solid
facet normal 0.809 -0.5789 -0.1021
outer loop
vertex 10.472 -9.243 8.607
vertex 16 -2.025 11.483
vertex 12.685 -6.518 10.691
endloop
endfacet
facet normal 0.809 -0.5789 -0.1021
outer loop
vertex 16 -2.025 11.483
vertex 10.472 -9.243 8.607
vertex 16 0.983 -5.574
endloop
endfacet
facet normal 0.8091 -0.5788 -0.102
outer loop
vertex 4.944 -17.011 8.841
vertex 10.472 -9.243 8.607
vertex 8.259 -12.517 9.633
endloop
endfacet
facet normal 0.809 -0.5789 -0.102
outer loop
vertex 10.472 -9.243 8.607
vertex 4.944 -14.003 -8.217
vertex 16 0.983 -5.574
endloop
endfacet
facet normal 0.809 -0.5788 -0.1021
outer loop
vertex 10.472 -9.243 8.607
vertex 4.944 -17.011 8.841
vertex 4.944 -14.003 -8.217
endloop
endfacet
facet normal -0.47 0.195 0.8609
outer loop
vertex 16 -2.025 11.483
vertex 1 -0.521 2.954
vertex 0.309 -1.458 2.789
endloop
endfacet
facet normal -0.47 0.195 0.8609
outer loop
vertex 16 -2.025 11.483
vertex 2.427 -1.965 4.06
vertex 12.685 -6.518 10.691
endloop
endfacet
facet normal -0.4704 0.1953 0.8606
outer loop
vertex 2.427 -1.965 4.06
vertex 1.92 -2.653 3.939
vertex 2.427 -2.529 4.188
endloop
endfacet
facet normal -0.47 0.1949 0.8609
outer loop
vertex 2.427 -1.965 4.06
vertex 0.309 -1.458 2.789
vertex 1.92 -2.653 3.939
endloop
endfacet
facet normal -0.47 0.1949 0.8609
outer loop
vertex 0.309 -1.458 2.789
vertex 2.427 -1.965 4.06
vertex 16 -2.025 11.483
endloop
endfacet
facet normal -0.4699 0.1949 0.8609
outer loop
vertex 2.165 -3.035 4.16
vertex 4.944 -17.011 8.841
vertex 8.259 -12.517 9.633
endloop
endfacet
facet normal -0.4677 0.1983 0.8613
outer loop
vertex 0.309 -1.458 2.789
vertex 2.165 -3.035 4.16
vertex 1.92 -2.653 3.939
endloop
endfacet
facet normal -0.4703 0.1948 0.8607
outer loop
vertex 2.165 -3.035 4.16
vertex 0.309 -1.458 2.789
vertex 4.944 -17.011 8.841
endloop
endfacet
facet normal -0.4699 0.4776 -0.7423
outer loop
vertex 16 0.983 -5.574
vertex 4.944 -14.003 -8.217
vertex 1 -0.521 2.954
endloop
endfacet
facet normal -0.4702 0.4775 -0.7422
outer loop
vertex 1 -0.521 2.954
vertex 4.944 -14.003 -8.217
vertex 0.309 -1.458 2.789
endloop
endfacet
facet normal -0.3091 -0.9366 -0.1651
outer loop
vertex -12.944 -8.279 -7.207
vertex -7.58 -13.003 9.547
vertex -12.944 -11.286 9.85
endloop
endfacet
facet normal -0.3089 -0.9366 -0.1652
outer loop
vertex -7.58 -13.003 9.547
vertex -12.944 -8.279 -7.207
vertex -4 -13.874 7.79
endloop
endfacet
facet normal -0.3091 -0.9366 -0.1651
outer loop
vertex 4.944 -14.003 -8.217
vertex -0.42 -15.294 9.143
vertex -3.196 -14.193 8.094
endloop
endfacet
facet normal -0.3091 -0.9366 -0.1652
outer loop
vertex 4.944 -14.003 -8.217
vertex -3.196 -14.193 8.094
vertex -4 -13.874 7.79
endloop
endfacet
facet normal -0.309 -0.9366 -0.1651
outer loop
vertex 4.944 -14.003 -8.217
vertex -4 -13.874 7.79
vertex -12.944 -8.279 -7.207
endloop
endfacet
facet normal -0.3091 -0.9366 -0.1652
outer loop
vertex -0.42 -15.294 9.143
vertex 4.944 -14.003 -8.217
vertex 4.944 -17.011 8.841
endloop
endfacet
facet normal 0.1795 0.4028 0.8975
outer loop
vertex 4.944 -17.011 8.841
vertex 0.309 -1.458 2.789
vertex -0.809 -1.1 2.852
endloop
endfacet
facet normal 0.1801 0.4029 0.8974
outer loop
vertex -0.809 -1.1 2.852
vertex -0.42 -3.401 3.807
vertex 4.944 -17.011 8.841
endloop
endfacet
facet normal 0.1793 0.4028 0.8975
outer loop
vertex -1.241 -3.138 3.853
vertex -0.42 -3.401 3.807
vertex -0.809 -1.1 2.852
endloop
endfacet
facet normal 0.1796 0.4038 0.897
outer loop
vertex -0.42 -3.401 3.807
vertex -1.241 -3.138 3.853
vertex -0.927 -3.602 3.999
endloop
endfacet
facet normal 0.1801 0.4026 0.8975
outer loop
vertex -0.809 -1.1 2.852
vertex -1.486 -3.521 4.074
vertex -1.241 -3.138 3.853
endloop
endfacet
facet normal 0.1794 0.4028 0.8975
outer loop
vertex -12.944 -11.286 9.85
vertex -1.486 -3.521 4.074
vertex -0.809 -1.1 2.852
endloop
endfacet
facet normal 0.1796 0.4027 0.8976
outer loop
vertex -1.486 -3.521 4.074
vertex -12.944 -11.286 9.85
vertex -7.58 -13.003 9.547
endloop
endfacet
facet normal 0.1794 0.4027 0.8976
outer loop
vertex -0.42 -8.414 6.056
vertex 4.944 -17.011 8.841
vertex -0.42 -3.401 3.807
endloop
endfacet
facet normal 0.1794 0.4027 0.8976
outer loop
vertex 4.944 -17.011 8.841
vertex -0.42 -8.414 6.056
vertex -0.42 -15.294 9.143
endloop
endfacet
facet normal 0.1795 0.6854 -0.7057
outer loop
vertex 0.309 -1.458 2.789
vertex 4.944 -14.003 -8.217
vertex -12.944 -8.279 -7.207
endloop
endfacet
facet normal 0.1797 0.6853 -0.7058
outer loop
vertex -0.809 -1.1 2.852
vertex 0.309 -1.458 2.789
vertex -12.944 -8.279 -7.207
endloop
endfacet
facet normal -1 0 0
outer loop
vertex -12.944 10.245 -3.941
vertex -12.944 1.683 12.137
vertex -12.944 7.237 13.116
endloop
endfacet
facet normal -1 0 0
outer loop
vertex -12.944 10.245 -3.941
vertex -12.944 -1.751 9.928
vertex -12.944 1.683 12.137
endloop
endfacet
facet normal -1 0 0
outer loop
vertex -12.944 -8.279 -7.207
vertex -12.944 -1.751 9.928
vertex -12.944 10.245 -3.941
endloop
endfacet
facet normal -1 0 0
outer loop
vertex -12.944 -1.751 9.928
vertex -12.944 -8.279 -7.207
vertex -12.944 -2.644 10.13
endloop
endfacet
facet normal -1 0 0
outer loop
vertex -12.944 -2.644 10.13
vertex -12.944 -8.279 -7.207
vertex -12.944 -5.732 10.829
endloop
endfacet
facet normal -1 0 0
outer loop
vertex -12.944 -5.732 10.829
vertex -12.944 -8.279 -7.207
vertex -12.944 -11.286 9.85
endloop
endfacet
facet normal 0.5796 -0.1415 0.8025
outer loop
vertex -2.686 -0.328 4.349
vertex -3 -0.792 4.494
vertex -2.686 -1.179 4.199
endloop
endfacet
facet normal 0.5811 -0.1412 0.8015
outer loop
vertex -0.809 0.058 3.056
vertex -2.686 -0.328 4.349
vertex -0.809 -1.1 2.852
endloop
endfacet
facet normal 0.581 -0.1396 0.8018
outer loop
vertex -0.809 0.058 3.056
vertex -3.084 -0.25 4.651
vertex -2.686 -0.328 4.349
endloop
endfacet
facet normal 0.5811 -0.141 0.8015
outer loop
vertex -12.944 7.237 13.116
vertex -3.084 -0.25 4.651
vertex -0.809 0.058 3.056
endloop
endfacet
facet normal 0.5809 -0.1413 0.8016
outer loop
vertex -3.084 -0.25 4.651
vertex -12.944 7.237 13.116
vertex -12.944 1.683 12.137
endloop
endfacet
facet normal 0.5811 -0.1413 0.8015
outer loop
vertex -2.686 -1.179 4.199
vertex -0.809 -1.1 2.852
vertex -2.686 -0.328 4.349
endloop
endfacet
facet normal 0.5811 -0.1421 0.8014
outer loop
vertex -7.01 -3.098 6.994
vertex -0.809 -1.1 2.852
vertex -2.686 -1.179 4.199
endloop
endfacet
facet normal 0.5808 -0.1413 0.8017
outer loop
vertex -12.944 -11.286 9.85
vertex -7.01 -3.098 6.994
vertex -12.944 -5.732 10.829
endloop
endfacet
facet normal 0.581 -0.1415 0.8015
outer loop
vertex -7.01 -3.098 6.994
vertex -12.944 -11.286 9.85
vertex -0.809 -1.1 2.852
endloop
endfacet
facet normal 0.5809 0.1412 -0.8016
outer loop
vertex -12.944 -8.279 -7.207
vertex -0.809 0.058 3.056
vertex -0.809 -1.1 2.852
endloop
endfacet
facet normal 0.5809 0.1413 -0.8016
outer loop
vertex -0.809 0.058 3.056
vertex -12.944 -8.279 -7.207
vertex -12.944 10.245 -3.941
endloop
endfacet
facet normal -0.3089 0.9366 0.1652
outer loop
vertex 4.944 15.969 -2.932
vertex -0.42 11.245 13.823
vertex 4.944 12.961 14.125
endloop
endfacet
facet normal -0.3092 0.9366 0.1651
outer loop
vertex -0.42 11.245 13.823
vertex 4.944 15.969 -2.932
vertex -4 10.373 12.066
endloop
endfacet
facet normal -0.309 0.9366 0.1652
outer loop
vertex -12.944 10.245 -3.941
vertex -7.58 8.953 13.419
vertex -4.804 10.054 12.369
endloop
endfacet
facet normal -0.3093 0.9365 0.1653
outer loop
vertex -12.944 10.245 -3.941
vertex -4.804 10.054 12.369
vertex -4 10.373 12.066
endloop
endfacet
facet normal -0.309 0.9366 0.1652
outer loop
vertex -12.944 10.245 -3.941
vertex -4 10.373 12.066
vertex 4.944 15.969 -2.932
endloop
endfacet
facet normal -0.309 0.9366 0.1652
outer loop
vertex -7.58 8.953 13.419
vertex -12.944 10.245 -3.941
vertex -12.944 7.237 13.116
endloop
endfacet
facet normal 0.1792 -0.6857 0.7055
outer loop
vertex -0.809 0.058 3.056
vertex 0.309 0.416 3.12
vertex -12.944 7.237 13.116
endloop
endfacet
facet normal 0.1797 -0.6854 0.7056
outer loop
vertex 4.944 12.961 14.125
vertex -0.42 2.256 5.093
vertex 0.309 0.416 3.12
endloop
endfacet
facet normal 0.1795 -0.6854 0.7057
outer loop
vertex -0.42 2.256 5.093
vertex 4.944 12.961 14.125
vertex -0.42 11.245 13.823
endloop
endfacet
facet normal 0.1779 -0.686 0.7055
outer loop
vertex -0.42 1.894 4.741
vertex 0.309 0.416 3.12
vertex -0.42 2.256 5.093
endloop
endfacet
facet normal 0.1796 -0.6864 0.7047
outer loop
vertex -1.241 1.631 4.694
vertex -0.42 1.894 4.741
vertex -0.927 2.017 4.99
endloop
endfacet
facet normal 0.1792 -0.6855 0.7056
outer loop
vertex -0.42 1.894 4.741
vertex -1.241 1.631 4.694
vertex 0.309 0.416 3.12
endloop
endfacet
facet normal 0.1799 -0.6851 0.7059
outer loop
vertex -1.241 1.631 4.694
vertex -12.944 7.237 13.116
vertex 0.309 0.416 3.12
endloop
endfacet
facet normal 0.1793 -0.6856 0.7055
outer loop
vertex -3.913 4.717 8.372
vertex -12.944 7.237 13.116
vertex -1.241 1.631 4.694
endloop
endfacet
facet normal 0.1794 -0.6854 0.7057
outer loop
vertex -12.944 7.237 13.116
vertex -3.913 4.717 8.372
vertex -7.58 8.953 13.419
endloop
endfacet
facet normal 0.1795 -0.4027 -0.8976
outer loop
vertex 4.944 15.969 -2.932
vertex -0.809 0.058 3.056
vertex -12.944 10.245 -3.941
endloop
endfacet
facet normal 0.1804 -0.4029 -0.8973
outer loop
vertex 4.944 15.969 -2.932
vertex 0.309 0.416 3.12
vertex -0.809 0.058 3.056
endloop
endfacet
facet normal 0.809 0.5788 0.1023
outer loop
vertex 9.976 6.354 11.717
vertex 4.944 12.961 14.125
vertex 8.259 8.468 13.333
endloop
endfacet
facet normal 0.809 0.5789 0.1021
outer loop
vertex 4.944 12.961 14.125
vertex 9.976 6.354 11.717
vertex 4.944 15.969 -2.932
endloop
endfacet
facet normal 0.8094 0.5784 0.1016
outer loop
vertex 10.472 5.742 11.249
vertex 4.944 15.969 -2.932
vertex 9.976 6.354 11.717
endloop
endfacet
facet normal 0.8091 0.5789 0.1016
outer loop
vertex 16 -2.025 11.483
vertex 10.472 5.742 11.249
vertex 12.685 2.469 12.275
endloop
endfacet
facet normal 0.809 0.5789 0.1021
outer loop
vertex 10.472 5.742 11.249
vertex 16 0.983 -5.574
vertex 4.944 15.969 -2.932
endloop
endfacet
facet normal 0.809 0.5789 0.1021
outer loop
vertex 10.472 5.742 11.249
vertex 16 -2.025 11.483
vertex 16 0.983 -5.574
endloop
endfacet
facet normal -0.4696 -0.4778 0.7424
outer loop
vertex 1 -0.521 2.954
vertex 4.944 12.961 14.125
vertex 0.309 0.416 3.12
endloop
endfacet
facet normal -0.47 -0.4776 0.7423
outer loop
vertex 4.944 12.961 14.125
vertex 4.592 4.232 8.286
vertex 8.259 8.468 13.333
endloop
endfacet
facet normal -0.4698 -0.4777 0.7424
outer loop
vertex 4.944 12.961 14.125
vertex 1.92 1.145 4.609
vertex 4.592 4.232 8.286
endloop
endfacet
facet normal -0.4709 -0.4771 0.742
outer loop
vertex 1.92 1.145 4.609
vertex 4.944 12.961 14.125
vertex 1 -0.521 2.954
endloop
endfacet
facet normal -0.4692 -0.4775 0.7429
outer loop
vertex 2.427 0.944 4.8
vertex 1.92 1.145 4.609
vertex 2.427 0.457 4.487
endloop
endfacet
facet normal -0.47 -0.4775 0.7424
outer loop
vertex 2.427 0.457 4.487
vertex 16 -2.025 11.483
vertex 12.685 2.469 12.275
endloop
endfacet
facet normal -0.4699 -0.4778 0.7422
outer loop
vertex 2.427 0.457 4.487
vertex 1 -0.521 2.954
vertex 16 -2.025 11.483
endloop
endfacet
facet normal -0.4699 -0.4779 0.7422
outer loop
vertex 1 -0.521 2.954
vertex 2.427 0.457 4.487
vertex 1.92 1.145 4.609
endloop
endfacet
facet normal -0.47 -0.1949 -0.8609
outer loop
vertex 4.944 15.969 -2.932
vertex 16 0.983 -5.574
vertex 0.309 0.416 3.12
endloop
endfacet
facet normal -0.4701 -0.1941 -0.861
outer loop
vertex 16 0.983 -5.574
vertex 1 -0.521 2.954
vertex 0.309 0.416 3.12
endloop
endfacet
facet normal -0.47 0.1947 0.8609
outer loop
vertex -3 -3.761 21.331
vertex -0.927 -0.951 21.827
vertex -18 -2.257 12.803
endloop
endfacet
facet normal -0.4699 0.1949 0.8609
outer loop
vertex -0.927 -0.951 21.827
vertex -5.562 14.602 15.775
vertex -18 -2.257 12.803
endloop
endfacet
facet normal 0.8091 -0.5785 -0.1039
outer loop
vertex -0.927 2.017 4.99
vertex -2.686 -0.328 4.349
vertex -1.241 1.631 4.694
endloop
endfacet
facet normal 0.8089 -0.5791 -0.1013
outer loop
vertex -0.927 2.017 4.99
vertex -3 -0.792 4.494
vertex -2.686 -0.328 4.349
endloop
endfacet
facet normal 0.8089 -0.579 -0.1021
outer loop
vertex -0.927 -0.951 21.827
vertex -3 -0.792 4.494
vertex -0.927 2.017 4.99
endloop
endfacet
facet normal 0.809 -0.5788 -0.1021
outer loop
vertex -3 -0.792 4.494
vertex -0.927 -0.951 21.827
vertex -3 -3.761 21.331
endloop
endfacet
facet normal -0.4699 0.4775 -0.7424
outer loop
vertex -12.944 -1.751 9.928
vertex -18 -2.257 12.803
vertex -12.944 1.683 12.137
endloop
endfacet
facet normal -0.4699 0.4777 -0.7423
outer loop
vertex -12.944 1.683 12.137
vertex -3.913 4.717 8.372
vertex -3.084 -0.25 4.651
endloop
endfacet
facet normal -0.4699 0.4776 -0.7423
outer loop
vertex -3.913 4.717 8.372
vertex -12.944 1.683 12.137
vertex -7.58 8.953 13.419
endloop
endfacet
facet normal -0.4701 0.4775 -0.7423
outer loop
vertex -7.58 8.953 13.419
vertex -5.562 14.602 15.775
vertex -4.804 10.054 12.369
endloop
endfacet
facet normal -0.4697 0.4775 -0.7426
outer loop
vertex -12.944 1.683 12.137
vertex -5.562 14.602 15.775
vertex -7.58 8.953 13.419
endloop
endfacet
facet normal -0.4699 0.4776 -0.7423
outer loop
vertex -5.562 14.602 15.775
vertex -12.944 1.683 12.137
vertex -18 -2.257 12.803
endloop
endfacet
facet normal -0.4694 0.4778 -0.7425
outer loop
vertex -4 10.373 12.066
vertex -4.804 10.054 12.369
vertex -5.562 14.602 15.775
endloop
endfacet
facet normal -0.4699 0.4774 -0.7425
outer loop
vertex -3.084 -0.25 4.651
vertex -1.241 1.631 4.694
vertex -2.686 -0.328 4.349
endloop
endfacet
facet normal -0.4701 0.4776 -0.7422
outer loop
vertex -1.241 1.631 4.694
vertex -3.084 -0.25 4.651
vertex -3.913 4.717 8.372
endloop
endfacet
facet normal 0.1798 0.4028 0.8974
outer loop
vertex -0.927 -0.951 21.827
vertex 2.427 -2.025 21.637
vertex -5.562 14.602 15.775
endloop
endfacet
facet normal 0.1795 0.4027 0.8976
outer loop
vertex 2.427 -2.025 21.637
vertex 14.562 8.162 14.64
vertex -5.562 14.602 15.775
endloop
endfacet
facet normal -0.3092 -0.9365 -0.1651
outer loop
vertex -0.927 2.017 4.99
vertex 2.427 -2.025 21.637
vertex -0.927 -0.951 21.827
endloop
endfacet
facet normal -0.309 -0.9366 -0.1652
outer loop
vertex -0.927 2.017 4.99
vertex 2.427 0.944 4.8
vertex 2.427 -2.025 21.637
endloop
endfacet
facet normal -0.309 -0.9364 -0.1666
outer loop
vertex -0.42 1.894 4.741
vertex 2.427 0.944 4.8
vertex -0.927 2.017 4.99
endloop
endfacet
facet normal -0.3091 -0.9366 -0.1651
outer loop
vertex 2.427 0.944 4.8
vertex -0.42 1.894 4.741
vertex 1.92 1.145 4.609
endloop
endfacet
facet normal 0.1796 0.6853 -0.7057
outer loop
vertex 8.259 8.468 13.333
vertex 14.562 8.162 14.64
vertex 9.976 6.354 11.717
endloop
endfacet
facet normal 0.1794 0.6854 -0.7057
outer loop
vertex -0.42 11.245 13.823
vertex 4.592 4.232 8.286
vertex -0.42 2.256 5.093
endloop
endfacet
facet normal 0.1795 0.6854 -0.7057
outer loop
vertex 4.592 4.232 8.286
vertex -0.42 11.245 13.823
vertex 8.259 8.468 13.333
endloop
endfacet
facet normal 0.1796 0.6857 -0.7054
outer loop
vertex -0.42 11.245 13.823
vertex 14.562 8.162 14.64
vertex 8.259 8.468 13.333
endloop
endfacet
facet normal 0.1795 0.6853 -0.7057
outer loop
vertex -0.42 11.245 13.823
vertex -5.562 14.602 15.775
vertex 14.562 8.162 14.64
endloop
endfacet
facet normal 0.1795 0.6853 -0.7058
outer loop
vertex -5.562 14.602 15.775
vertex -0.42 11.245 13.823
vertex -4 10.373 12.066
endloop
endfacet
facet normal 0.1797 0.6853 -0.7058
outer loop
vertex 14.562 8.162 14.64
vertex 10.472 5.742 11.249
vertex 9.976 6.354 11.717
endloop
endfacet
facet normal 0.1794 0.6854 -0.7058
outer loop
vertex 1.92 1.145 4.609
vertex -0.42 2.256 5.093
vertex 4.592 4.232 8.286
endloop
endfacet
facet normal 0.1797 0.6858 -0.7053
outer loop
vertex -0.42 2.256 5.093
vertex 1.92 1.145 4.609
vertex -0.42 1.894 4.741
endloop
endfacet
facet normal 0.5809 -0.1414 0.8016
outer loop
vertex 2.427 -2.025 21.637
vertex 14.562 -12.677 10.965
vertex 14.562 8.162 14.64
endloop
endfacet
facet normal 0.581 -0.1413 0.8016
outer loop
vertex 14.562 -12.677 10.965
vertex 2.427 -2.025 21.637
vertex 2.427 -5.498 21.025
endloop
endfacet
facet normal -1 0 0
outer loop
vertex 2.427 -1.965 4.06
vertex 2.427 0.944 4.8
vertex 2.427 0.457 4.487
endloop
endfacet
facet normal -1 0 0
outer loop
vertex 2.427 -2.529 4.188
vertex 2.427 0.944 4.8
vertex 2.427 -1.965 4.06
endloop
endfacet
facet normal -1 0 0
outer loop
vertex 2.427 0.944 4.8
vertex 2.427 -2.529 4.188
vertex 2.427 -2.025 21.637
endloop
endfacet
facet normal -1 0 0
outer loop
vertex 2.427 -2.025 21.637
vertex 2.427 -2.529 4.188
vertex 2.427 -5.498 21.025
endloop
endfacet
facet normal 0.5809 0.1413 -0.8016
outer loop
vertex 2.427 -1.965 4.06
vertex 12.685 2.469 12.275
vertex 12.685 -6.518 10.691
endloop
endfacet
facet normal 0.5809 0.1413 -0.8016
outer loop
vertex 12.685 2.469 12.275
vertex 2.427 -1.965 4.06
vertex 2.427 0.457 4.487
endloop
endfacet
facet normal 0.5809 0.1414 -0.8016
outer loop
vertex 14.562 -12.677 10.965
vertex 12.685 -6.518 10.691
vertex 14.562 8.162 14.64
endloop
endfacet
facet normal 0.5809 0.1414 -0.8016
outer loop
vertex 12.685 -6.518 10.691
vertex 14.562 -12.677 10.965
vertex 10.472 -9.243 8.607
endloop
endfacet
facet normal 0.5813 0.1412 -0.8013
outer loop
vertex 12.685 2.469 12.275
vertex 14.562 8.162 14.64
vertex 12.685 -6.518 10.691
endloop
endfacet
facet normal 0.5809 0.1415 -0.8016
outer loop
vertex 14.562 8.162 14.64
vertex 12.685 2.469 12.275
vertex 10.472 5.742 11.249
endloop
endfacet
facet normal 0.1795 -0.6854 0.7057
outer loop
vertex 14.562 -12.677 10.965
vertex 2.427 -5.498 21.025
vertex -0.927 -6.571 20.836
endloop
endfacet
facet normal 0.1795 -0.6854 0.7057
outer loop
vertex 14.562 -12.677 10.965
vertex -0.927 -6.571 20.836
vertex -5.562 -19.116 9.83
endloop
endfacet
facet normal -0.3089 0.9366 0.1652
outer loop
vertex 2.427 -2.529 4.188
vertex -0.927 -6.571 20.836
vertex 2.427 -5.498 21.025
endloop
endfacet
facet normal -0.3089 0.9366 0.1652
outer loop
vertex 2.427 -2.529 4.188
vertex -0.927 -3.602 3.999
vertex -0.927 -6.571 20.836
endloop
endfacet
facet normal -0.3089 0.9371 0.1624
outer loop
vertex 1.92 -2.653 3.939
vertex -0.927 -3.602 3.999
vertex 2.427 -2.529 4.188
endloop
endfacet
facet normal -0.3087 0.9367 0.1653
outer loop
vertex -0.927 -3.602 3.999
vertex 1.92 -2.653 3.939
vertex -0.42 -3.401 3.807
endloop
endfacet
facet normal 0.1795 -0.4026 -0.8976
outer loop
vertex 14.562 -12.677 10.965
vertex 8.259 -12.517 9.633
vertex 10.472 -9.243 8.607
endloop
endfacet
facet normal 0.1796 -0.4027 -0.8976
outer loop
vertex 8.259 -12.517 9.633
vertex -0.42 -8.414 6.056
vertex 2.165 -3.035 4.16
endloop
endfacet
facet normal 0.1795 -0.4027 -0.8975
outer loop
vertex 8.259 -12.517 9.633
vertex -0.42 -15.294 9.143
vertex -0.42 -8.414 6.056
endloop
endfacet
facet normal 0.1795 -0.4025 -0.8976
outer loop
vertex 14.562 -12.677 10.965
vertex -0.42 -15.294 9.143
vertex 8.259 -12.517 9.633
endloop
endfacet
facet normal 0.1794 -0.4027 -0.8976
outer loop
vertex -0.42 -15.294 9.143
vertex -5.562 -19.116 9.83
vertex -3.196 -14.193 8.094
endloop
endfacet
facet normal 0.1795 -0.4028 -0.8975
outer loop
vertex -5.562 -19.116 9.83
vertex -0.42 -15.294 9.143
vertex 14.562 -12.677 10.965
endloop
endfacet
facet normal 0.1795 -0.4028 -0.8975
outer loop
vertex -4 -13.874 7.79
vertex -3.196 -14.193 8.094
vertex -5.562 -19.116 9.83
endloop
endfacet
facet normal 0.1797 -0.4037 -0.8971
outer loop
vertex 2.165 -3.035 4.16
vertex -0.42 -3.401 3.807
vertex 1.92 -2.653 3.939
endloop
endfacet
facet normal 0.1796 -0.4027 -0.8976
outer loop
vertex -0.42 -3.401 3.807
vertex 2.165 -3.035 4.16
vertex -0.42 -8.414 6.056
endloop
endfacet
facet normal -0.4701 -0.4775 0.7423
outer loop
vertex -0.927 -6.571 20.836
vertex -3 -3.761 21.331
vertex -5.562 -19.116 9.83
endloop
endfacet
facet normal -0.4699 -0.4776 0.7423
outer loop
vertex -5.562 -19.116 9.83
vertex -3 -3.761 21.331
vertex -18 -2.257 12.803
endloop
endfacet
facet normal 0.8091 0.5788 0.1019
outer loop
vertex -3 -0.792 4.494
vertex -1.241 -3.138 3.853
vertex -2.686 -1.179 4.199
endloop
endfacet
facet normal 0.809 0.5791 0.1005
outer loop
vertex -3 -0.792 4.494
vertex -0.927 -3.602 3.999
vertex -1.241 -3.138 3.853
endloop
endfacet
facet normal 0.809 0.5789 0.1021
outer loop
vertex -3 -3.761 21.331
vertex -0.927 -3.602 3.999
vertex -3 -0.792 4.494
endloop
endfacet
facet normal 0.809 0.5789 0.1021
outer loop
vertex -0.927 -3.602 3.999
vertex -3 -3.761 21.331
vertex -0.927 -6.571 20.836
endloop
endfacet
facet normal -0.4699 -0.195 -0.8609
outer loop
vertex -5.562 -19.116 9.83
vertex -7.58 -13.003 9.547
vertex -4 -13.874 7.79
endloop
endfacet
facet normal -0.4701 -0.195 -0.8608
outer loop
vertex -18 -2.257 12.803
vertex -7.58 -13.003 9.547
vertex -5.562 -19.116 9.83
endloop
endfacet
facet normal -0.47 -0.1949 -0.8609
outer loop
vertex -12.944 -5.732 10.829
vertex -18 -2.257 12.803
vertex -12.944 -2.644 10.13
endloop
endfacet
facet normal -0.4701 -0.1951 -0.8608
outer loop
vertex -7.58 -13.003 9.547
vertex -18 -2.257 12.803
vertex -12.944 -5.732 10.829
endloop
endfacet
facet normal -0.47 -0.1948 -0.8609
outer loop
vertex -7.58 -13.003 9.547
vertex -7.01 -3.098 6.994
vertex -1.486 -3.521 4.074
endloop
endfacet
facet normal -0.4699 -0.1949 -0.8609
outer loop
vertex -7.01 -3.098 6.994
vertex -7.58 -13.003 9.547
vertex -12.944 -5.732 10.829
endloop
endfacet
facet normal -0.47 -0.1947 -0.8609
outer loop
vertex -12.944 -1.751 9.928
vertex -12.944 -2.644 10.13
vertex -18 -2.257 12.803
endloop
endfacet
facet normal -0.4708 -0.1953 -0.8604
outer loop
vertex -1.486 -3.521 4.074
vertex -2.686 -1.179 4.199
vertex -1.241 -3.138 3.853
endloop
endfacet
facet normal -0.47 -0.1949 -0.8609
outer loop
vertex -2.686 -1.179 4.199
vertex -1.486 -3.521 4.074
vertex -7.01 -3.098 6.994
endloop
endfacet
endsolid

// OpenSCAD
rotate([10,0,0]) {
    translate([0,0,-5]) rotate_extrude($fn=5) translate([-11,8]) circle(10, $fn=3);
    translate([0,0,+5]) rotate_extrude($fn=5) translate([  8,8]) circle(10, $fn=3);
}
